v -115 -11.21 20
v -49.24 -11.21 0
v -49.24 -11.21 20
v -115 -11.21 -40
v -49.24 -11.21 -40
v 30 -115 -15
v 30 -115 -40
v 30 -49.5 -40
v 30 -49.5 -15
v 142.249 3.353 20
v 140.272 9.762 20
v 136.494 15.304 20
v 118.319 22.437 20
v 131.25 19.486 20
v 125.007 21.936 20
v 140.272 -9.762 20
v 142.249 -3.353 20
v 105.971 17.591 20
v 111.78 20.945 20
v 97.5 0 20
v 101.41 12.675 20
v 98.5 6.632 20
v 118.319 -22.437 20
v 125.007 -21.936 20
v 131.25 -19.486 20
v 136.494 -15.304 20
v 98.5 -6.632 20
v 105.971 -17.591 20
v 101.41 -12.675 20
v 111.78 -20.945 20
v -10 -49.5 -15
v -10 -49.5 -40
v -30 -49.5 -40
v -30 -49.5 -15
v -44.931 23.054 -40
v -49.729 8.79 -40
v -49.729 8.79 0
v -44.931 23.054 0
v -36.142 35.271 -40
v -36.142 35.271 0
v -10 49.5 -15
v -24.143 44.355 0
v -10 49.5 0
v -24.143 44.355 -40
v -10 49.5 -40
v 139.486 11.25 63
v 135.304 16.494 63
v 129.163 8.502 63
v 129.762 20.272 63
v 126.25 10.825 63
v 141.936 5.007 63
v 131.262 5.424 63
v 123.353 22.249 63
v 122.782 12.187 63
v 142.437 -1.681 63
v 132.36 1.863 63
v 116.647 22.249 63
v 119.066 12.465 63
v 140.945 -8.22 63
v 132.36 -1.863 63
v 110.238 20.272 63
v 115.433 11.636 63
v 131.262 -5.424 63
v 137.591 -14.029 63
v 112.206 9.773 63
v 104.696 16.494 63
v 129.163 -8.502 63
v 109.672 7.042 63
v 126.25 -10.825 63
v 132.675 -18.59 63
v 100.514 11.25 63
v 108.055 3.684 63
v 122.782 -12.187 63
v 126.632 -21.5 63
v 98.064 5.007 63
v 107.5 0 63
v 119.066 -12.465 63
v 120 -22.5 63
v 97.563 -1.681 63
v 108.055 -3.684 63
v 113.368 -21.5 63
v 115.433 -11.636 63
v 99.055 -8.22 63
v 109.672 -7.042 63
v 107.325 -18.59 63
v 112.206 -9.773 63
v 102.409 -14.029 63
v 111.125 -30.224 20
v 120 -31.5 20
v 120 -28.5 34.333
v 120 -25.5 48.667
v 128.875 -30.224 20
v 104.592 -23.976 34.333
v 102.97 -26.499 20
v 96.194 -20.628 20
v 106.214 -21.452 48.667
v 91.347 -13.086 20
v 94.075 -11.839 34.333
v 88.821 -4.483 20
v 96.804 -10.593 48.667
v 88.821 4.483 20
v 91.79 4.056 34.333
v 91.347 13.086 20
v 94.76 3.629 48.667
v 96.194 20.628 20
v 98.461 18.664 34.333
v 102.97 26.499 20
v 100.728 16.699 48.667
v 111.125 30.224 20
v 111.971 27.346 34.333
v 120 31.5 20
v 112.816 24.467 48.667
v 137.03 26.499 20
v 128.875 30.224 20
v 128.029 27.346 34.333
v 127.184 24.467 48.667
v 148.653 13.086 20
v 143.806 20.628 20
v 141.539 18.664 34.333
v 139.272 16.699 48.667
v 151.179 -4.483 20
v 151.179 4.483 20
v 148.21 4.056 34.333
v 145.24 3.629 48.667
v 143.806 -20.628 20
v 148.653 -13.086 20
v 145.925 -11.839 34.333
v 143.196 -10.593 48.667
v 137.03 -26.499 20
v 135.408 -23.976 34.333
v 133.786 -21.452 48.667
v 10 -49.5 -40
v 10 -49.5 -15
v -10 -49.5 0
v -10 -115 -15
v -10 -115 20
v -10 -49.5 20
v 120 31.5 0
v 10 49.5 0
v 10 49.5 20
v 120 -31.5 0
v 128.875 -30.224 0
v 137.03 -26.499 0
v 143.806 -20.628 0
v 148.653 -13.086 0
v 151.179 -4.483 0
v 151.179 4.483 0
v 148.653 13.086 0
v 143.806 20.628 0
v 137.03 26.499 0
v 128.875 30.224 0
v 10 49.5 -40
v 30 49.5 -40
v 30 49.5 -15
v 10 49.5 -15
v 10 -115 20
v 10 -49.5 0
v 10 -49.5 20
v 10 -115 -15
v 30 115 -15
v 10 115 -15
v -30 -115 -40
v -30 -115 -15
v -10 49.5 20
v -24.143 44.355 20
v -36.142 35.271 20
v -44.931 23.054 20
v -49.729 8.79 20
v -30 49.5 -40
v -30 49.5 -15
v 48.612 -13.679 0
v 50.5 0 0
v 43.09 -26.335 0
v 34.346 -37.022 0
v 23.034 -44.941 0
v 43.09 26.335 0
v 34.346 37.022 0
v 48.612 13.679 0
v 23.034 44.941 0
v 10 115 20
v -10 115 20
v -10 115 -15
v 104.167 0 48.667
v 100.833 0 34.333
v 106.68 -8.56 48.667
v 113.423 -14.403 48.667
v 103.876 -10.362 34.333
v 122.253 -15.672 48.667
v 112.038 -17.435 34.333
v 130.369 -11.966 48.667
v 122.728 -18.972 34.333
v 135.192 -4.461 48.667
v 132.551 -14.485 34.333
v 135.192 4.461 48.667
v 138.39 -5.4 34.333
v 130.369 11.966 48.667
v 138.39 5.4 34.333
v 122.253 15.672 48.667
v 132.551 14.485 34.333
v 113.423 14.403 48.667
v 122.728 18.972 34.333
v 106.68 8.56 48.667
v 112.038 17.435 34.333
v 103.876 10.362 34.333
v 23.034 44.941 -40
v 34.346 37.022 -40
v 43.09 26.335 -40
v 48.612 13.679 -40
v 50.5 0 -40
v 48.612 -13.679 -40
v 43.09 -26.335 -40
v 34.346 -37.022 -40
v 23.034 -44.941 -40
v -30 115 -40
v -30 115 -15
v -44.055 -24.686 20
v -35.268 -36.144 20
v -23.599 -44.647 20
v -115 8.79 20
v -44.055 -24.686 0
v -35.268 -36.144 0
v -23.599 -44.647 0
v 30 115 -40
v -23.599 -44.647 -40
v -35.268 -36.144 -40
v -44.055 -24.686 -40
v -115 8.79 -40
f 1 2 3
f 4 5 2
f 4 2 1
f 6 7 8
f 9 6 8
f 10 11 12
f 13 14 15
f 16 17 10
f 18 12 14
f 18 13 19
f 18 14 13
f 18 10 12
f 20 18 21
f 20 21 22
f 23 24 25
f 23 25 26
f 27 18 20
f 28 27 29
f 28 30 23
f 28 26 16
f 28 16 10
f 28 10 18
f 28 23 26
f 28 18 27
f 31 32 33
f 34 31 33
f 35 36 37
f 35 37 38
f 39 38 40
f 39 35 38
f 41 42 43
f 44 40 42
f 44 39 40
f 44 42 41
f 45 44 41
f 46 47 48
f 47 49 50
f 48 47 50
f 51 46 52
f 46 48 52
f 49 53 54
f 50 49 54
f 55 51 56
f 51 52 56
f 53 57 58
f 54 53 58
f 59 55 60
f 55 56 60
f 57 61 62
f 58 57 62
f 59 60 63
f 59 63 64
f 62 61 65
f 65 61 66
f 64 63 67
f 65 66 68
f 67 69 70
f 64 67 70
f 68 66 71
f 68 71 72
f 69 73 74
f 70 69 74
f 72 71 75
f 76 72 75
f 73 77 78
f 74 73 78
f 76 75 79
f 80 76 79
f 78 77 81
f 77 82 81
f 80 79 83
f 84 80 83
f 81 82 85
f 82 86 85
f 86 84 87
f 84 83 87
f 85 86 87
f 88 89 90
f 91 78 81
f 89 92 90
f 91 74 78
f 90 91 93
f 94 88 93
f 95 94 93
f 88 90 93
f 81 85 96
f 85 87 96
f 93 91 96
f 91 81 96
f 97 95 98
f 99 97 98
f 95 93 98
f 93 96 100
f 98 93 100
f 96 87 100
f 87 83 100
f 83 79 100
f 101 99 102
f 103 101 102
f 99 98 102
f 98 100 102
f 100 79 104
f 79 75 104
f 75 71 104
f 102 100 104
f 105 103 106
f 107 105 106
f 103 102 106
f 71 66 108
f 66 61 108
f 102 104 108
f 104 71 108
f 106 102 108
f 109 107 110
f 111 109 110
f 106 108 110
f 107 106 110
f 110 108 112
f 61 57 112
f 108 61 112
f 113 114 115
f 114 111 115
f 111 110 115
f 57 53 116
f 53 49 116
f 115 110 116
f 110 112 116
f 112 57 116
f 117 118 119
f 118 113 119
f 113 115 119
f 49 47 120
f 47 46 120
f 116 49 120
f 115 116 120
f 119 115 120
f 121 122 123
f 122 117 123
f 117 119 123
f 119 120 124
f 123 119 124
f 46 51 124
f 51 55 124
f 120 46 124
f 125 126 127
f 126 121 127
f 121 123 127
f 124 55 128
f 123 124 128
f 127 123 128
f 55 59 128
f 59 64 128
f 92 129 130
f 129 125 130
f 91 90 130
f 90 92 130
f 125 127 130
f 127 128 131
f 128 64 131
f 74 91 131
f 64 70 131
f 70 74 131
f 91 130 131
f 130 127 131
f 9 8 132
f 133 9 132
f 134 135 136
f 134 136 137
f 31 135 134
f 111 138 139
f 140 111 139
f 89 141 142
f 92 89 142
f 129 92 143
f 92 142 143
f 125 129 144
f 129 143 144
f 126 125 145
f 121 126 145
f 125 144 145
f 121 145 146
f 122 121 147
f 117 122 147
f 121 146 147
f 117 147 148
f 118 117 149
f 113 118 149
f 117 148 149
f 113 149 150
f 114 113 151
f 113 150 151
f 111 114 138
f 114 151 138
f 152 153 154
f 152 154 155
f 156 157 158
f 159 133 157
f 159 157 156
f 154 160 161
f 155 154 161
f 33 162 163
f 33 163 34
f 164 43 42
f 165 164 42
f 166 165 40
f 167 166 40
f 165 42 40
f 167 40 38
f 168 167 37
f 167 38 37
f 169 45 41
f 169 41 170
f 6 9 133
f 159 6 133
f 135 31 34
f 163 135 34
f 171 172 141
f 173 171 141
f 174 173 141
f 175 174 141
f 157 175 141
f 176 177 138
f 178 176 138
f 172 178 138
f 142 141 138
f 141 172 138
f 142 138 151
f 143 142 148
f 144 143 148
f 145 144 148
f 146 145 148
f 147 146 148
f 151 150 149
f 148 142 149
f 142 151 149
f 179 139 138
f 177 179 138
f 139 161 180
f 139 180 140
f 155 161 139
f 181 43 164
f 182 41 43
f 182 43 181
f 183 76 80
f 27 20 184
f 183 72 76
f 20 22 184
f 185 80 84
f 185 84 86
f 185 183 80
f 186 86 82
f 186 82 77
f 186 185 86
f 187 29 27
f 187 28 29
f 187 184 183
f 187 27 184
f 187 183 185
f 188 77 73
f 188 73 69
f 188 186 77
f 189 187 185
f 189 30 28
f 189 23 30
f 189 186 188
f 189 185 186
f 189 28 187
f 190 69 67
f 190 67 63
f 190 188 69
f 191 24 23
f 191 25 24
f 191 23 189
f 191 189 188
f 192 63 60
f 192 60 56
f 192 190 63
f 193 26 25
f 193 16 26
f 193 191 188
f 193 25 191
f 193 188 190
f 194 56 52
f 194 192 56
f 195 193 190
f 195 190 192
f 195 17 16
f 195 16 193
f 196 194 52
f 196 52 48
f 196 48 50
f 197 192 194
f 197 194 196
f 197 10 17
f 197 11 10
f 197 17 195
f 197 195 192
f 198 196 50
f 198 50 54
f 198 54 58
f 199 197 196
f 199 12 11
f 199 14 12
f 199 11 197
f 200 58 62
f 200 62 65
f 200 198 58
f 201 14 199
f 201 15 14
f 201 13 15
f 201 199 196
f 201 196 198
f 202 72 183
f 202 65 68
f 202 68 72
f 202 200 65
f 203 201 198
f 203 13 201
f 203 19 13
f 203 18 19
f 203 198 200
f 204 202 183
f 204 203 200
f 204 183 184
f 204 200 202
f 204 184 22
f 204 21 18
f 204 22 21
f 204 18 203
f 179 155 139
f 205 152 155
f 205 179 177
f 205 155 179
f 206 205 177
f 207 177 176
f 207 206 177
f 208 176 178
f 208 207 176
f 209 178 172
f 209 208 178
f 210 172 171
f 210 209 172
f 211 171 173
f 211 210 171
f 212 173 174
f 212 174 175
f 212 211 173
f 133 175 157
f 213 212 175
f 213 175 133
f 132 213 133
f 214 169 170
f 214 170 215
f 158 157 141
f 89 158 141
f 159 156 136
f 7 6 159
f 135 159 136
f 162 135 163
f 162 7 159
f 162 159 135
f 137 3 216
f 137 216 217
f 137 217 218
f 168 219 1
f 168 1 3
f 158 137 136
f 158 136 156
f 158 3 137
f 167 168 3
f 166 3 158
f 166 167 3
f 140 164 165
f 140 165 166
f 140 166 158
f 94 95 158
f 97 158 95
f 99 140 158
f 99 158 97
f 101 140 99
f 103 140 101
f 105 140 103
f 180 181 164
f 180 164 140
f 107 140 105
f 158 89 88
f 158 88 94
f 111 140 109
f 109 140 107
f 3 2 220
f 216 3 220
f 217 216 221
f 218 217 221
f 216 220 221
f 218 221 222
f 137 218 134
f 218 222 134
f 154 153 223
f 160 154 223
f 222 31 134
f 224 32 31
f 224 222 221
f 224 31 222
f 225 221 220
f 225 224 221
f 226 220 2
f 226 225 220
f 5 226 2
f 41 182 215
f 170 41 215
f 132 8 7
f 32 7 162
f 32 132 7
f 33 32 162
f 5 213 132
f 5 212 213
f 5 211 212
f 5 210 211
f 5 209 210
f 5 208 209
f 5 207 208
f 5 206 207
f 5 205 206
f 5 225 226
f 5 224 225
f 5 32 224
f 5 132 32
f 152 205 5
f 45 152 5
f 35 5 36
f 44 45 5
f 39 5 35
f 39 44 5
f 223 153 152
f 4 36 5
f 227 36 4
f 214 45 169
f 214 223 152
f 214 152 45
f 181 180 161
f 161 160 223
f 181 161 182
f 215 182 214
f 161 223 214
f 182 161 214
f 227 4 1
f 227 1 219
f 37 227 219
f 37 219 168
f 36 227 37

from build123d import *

# Parameters (mm, degrees)
RESSALTO_EXTRUS_O4_DEPTH = 20
RESSALTO_EXTRUS_O5_START = 40
ESBO_O6_R                = 50.5
RESSALTO_EXTRUS_O5_DEPTH = 40
RESSALTO_EXTRUS_O6_START = 40
RESSALTO_EXTRUS_O6_DEPTH = 40
RESSALTO_EXTRUS_O7_START = 40
RESSALTO_EXTRUS_O7_DEPTH = 40
RESSALTO_EXTRUS_O8_START = 40
RESSALTO_EXTRUS_O8_DEPTH = 40
ESBO_O12_W               = 60
ESBO_O12_H               = 65.5
RESSALTO_EXTRUS_O9_DEPTH = 25


with BuildPart() as part:
    # Esboço2 → Ressalto-extrusão4 (new body)
    with BuildSketch(Plane.XY):
        with BuildLine():
            Line((-10, 115), (-10, 49.5))
            ThreePointArc((-10, 49.5), (-36.141814954, 35.270656526), (-49.729212576, 8.789506048))
            Line((-49.729212576, 8.789506048), (-115, 8.789506048))
            Line((-115, 8.789506048), (-115, -11.210493952))
            Line((-115, -11.210493952), (-49.239971825, -11.210493952))
            ThreePointArc((-49.239971825, -11.210493952), (-35.268472235, -36.143946467), (-10, -49.5))
            Line((-10, -49.5), (-10, -115))
            Line((-10, -115), (10, -115))
            Line((10, -115), (10, -49.5))
            Line((10, -49.5), (120, -31.5))
            ThreePointArc((120, -31.5), (151.5, 0), (120, 31.5))
            Line((120, 31.5), (10, 49.5))
            Line((10, 49.5), (10, 115))
            Line((10, 115), (-10, 115))
        make_face()
    extrude(amount=RESSALTO_EXTRUS_O4_DEPTH)

    # Esboço3 → Revolução2 (revolve)
    with BuildSketch(Plane(origin=(0, 0, 0), x_dir=(1, 0, 0), z_dir=(0, 1, 0)), mode=Mode.PRIVATE) as revolu_o2_sk:
        Polygon((120, -63), (120, -20), (151.5, -20), (142.5, -63), align=None)
    revolve(revolu_o2_sk.sketch.rotate(Axis((120, 0, 63), (0, 0, -1)), 90), axis=Axis((120, 0, 63), (0, 0, -1)))

    # Esboço5 → Corte-Revolução1 (revolve, cut)
    with BuildSketch(Plane(origin=(0, 0, 0), x_dir=(1, 0, 0), z_dir=(0, 1, 0)), mode=Mode.PRIVATE) as corte_revolu_o1_sk:
        Polygon((120, -20), (120, -63), (132.5, -63), (142.5, -20), align=None)
    revolve(corte_revolu_o1_sk.sketch.rotate(Axis((120, 0, 20), (0, 0, 1)), 180), axis=Axis((120, 0, 20), (0, 0, 1)), mode=Mode.SUBTRACT)

    # Esboço6 → Ressalto-extrusão5 (add)
    with BuildSketch(Plane(origin=(0, 0, 0), x_dir=(-1, 0, 0), z_dir=(0, 0, -1)).offset(RESSALTO_EXTRUS_O5_START)):
        Circle(ESBO_O6_R)
    extrude(amount=-RESSALTO_EXTRUS_O5_DEPTH)

    # Esboço7 → Ressalto-extrusão6 (add)
    with BuildSketch(Plane(origin=(0, 0, 0), x_dir=(-1, 0, 0), z_dir=(0, 0, -1)).offset(RESSALTO_EXTRUS_O6_START)):
        with BuildLine():
            Line((-10, -49.5), (-10, -115))
            Line((-10, -115), (10, -115))
            Line((10, -115), (10, -49.5))
            ThreePointArc((10, -49.5), (0, -50.5), (-10, -49.5))
        make_face()
    extrude(amount=-RESSALTO_EXTRUS_O6_DEPTH)

    # Esboço8 → Ressalto-extrusão7 (add)
    with BuildSketch(Plane(origin=(0, 0, 0), x_dir=(-1, 0, 0), z_dir=(0, 0, -1)).offset(RESSALTO_EXTRUS_O7_START)):
        with BuildLine():
            Line((10, 49.5), (10, 115))
            Line((10, 115), (-10, 115))
            Line((-10, 115), (-10, 49.5))
            ThreePointArc((-10, 49.5), (0, 50.5), (10, 49.5))
        make_face()
    extrude(amount=-RESSALTO_EXTRUS_O7_DEPTH)

    # Esboço10 → Ressalto-extrusão8 (add)
    with BuildSketch(Plane(origin=(0, 0, 0), x_dir=(-1, 0, 0), z_dir=(0, 0, -1)).offset(RESSALTO_EXTRUS_O8_START)):
        with BuildLine():
            Line((49.239971825, -11.210493952), (115, -11.210493952))
            Line((115, -11.210493952), (115, 8.789506048))
            Line((115, 8.789506048), (49.729212576, 8.789506048))
            ThreePointArc((49.729212576, 8.789506048), (50.484897398, -1.234963456), (49.239971825, -11.210493952))
        make_face()
    extrude(amount=-RESSALTO_EXTRUS_O8_DEPTH)

    # Esboço12 → Ressalto-extrusão9 (add)
    with BuildSketch(Plane(origin=(0, 0, -40), x_dir=(-1, 0, 0), z_dir=(0, 0, -1))):
        with Locations((0, 82.25)):
            Rectangle(ESBO_O12_W, ESBO_O12_H)
        with Locations((0, -82.25)):
            Rectangle(ESBO_O12_W, ESBO_O12_H)
    extrude(amount=-RESSALTO_EXTRUS_O9_DEPTH)


solid = part.part
